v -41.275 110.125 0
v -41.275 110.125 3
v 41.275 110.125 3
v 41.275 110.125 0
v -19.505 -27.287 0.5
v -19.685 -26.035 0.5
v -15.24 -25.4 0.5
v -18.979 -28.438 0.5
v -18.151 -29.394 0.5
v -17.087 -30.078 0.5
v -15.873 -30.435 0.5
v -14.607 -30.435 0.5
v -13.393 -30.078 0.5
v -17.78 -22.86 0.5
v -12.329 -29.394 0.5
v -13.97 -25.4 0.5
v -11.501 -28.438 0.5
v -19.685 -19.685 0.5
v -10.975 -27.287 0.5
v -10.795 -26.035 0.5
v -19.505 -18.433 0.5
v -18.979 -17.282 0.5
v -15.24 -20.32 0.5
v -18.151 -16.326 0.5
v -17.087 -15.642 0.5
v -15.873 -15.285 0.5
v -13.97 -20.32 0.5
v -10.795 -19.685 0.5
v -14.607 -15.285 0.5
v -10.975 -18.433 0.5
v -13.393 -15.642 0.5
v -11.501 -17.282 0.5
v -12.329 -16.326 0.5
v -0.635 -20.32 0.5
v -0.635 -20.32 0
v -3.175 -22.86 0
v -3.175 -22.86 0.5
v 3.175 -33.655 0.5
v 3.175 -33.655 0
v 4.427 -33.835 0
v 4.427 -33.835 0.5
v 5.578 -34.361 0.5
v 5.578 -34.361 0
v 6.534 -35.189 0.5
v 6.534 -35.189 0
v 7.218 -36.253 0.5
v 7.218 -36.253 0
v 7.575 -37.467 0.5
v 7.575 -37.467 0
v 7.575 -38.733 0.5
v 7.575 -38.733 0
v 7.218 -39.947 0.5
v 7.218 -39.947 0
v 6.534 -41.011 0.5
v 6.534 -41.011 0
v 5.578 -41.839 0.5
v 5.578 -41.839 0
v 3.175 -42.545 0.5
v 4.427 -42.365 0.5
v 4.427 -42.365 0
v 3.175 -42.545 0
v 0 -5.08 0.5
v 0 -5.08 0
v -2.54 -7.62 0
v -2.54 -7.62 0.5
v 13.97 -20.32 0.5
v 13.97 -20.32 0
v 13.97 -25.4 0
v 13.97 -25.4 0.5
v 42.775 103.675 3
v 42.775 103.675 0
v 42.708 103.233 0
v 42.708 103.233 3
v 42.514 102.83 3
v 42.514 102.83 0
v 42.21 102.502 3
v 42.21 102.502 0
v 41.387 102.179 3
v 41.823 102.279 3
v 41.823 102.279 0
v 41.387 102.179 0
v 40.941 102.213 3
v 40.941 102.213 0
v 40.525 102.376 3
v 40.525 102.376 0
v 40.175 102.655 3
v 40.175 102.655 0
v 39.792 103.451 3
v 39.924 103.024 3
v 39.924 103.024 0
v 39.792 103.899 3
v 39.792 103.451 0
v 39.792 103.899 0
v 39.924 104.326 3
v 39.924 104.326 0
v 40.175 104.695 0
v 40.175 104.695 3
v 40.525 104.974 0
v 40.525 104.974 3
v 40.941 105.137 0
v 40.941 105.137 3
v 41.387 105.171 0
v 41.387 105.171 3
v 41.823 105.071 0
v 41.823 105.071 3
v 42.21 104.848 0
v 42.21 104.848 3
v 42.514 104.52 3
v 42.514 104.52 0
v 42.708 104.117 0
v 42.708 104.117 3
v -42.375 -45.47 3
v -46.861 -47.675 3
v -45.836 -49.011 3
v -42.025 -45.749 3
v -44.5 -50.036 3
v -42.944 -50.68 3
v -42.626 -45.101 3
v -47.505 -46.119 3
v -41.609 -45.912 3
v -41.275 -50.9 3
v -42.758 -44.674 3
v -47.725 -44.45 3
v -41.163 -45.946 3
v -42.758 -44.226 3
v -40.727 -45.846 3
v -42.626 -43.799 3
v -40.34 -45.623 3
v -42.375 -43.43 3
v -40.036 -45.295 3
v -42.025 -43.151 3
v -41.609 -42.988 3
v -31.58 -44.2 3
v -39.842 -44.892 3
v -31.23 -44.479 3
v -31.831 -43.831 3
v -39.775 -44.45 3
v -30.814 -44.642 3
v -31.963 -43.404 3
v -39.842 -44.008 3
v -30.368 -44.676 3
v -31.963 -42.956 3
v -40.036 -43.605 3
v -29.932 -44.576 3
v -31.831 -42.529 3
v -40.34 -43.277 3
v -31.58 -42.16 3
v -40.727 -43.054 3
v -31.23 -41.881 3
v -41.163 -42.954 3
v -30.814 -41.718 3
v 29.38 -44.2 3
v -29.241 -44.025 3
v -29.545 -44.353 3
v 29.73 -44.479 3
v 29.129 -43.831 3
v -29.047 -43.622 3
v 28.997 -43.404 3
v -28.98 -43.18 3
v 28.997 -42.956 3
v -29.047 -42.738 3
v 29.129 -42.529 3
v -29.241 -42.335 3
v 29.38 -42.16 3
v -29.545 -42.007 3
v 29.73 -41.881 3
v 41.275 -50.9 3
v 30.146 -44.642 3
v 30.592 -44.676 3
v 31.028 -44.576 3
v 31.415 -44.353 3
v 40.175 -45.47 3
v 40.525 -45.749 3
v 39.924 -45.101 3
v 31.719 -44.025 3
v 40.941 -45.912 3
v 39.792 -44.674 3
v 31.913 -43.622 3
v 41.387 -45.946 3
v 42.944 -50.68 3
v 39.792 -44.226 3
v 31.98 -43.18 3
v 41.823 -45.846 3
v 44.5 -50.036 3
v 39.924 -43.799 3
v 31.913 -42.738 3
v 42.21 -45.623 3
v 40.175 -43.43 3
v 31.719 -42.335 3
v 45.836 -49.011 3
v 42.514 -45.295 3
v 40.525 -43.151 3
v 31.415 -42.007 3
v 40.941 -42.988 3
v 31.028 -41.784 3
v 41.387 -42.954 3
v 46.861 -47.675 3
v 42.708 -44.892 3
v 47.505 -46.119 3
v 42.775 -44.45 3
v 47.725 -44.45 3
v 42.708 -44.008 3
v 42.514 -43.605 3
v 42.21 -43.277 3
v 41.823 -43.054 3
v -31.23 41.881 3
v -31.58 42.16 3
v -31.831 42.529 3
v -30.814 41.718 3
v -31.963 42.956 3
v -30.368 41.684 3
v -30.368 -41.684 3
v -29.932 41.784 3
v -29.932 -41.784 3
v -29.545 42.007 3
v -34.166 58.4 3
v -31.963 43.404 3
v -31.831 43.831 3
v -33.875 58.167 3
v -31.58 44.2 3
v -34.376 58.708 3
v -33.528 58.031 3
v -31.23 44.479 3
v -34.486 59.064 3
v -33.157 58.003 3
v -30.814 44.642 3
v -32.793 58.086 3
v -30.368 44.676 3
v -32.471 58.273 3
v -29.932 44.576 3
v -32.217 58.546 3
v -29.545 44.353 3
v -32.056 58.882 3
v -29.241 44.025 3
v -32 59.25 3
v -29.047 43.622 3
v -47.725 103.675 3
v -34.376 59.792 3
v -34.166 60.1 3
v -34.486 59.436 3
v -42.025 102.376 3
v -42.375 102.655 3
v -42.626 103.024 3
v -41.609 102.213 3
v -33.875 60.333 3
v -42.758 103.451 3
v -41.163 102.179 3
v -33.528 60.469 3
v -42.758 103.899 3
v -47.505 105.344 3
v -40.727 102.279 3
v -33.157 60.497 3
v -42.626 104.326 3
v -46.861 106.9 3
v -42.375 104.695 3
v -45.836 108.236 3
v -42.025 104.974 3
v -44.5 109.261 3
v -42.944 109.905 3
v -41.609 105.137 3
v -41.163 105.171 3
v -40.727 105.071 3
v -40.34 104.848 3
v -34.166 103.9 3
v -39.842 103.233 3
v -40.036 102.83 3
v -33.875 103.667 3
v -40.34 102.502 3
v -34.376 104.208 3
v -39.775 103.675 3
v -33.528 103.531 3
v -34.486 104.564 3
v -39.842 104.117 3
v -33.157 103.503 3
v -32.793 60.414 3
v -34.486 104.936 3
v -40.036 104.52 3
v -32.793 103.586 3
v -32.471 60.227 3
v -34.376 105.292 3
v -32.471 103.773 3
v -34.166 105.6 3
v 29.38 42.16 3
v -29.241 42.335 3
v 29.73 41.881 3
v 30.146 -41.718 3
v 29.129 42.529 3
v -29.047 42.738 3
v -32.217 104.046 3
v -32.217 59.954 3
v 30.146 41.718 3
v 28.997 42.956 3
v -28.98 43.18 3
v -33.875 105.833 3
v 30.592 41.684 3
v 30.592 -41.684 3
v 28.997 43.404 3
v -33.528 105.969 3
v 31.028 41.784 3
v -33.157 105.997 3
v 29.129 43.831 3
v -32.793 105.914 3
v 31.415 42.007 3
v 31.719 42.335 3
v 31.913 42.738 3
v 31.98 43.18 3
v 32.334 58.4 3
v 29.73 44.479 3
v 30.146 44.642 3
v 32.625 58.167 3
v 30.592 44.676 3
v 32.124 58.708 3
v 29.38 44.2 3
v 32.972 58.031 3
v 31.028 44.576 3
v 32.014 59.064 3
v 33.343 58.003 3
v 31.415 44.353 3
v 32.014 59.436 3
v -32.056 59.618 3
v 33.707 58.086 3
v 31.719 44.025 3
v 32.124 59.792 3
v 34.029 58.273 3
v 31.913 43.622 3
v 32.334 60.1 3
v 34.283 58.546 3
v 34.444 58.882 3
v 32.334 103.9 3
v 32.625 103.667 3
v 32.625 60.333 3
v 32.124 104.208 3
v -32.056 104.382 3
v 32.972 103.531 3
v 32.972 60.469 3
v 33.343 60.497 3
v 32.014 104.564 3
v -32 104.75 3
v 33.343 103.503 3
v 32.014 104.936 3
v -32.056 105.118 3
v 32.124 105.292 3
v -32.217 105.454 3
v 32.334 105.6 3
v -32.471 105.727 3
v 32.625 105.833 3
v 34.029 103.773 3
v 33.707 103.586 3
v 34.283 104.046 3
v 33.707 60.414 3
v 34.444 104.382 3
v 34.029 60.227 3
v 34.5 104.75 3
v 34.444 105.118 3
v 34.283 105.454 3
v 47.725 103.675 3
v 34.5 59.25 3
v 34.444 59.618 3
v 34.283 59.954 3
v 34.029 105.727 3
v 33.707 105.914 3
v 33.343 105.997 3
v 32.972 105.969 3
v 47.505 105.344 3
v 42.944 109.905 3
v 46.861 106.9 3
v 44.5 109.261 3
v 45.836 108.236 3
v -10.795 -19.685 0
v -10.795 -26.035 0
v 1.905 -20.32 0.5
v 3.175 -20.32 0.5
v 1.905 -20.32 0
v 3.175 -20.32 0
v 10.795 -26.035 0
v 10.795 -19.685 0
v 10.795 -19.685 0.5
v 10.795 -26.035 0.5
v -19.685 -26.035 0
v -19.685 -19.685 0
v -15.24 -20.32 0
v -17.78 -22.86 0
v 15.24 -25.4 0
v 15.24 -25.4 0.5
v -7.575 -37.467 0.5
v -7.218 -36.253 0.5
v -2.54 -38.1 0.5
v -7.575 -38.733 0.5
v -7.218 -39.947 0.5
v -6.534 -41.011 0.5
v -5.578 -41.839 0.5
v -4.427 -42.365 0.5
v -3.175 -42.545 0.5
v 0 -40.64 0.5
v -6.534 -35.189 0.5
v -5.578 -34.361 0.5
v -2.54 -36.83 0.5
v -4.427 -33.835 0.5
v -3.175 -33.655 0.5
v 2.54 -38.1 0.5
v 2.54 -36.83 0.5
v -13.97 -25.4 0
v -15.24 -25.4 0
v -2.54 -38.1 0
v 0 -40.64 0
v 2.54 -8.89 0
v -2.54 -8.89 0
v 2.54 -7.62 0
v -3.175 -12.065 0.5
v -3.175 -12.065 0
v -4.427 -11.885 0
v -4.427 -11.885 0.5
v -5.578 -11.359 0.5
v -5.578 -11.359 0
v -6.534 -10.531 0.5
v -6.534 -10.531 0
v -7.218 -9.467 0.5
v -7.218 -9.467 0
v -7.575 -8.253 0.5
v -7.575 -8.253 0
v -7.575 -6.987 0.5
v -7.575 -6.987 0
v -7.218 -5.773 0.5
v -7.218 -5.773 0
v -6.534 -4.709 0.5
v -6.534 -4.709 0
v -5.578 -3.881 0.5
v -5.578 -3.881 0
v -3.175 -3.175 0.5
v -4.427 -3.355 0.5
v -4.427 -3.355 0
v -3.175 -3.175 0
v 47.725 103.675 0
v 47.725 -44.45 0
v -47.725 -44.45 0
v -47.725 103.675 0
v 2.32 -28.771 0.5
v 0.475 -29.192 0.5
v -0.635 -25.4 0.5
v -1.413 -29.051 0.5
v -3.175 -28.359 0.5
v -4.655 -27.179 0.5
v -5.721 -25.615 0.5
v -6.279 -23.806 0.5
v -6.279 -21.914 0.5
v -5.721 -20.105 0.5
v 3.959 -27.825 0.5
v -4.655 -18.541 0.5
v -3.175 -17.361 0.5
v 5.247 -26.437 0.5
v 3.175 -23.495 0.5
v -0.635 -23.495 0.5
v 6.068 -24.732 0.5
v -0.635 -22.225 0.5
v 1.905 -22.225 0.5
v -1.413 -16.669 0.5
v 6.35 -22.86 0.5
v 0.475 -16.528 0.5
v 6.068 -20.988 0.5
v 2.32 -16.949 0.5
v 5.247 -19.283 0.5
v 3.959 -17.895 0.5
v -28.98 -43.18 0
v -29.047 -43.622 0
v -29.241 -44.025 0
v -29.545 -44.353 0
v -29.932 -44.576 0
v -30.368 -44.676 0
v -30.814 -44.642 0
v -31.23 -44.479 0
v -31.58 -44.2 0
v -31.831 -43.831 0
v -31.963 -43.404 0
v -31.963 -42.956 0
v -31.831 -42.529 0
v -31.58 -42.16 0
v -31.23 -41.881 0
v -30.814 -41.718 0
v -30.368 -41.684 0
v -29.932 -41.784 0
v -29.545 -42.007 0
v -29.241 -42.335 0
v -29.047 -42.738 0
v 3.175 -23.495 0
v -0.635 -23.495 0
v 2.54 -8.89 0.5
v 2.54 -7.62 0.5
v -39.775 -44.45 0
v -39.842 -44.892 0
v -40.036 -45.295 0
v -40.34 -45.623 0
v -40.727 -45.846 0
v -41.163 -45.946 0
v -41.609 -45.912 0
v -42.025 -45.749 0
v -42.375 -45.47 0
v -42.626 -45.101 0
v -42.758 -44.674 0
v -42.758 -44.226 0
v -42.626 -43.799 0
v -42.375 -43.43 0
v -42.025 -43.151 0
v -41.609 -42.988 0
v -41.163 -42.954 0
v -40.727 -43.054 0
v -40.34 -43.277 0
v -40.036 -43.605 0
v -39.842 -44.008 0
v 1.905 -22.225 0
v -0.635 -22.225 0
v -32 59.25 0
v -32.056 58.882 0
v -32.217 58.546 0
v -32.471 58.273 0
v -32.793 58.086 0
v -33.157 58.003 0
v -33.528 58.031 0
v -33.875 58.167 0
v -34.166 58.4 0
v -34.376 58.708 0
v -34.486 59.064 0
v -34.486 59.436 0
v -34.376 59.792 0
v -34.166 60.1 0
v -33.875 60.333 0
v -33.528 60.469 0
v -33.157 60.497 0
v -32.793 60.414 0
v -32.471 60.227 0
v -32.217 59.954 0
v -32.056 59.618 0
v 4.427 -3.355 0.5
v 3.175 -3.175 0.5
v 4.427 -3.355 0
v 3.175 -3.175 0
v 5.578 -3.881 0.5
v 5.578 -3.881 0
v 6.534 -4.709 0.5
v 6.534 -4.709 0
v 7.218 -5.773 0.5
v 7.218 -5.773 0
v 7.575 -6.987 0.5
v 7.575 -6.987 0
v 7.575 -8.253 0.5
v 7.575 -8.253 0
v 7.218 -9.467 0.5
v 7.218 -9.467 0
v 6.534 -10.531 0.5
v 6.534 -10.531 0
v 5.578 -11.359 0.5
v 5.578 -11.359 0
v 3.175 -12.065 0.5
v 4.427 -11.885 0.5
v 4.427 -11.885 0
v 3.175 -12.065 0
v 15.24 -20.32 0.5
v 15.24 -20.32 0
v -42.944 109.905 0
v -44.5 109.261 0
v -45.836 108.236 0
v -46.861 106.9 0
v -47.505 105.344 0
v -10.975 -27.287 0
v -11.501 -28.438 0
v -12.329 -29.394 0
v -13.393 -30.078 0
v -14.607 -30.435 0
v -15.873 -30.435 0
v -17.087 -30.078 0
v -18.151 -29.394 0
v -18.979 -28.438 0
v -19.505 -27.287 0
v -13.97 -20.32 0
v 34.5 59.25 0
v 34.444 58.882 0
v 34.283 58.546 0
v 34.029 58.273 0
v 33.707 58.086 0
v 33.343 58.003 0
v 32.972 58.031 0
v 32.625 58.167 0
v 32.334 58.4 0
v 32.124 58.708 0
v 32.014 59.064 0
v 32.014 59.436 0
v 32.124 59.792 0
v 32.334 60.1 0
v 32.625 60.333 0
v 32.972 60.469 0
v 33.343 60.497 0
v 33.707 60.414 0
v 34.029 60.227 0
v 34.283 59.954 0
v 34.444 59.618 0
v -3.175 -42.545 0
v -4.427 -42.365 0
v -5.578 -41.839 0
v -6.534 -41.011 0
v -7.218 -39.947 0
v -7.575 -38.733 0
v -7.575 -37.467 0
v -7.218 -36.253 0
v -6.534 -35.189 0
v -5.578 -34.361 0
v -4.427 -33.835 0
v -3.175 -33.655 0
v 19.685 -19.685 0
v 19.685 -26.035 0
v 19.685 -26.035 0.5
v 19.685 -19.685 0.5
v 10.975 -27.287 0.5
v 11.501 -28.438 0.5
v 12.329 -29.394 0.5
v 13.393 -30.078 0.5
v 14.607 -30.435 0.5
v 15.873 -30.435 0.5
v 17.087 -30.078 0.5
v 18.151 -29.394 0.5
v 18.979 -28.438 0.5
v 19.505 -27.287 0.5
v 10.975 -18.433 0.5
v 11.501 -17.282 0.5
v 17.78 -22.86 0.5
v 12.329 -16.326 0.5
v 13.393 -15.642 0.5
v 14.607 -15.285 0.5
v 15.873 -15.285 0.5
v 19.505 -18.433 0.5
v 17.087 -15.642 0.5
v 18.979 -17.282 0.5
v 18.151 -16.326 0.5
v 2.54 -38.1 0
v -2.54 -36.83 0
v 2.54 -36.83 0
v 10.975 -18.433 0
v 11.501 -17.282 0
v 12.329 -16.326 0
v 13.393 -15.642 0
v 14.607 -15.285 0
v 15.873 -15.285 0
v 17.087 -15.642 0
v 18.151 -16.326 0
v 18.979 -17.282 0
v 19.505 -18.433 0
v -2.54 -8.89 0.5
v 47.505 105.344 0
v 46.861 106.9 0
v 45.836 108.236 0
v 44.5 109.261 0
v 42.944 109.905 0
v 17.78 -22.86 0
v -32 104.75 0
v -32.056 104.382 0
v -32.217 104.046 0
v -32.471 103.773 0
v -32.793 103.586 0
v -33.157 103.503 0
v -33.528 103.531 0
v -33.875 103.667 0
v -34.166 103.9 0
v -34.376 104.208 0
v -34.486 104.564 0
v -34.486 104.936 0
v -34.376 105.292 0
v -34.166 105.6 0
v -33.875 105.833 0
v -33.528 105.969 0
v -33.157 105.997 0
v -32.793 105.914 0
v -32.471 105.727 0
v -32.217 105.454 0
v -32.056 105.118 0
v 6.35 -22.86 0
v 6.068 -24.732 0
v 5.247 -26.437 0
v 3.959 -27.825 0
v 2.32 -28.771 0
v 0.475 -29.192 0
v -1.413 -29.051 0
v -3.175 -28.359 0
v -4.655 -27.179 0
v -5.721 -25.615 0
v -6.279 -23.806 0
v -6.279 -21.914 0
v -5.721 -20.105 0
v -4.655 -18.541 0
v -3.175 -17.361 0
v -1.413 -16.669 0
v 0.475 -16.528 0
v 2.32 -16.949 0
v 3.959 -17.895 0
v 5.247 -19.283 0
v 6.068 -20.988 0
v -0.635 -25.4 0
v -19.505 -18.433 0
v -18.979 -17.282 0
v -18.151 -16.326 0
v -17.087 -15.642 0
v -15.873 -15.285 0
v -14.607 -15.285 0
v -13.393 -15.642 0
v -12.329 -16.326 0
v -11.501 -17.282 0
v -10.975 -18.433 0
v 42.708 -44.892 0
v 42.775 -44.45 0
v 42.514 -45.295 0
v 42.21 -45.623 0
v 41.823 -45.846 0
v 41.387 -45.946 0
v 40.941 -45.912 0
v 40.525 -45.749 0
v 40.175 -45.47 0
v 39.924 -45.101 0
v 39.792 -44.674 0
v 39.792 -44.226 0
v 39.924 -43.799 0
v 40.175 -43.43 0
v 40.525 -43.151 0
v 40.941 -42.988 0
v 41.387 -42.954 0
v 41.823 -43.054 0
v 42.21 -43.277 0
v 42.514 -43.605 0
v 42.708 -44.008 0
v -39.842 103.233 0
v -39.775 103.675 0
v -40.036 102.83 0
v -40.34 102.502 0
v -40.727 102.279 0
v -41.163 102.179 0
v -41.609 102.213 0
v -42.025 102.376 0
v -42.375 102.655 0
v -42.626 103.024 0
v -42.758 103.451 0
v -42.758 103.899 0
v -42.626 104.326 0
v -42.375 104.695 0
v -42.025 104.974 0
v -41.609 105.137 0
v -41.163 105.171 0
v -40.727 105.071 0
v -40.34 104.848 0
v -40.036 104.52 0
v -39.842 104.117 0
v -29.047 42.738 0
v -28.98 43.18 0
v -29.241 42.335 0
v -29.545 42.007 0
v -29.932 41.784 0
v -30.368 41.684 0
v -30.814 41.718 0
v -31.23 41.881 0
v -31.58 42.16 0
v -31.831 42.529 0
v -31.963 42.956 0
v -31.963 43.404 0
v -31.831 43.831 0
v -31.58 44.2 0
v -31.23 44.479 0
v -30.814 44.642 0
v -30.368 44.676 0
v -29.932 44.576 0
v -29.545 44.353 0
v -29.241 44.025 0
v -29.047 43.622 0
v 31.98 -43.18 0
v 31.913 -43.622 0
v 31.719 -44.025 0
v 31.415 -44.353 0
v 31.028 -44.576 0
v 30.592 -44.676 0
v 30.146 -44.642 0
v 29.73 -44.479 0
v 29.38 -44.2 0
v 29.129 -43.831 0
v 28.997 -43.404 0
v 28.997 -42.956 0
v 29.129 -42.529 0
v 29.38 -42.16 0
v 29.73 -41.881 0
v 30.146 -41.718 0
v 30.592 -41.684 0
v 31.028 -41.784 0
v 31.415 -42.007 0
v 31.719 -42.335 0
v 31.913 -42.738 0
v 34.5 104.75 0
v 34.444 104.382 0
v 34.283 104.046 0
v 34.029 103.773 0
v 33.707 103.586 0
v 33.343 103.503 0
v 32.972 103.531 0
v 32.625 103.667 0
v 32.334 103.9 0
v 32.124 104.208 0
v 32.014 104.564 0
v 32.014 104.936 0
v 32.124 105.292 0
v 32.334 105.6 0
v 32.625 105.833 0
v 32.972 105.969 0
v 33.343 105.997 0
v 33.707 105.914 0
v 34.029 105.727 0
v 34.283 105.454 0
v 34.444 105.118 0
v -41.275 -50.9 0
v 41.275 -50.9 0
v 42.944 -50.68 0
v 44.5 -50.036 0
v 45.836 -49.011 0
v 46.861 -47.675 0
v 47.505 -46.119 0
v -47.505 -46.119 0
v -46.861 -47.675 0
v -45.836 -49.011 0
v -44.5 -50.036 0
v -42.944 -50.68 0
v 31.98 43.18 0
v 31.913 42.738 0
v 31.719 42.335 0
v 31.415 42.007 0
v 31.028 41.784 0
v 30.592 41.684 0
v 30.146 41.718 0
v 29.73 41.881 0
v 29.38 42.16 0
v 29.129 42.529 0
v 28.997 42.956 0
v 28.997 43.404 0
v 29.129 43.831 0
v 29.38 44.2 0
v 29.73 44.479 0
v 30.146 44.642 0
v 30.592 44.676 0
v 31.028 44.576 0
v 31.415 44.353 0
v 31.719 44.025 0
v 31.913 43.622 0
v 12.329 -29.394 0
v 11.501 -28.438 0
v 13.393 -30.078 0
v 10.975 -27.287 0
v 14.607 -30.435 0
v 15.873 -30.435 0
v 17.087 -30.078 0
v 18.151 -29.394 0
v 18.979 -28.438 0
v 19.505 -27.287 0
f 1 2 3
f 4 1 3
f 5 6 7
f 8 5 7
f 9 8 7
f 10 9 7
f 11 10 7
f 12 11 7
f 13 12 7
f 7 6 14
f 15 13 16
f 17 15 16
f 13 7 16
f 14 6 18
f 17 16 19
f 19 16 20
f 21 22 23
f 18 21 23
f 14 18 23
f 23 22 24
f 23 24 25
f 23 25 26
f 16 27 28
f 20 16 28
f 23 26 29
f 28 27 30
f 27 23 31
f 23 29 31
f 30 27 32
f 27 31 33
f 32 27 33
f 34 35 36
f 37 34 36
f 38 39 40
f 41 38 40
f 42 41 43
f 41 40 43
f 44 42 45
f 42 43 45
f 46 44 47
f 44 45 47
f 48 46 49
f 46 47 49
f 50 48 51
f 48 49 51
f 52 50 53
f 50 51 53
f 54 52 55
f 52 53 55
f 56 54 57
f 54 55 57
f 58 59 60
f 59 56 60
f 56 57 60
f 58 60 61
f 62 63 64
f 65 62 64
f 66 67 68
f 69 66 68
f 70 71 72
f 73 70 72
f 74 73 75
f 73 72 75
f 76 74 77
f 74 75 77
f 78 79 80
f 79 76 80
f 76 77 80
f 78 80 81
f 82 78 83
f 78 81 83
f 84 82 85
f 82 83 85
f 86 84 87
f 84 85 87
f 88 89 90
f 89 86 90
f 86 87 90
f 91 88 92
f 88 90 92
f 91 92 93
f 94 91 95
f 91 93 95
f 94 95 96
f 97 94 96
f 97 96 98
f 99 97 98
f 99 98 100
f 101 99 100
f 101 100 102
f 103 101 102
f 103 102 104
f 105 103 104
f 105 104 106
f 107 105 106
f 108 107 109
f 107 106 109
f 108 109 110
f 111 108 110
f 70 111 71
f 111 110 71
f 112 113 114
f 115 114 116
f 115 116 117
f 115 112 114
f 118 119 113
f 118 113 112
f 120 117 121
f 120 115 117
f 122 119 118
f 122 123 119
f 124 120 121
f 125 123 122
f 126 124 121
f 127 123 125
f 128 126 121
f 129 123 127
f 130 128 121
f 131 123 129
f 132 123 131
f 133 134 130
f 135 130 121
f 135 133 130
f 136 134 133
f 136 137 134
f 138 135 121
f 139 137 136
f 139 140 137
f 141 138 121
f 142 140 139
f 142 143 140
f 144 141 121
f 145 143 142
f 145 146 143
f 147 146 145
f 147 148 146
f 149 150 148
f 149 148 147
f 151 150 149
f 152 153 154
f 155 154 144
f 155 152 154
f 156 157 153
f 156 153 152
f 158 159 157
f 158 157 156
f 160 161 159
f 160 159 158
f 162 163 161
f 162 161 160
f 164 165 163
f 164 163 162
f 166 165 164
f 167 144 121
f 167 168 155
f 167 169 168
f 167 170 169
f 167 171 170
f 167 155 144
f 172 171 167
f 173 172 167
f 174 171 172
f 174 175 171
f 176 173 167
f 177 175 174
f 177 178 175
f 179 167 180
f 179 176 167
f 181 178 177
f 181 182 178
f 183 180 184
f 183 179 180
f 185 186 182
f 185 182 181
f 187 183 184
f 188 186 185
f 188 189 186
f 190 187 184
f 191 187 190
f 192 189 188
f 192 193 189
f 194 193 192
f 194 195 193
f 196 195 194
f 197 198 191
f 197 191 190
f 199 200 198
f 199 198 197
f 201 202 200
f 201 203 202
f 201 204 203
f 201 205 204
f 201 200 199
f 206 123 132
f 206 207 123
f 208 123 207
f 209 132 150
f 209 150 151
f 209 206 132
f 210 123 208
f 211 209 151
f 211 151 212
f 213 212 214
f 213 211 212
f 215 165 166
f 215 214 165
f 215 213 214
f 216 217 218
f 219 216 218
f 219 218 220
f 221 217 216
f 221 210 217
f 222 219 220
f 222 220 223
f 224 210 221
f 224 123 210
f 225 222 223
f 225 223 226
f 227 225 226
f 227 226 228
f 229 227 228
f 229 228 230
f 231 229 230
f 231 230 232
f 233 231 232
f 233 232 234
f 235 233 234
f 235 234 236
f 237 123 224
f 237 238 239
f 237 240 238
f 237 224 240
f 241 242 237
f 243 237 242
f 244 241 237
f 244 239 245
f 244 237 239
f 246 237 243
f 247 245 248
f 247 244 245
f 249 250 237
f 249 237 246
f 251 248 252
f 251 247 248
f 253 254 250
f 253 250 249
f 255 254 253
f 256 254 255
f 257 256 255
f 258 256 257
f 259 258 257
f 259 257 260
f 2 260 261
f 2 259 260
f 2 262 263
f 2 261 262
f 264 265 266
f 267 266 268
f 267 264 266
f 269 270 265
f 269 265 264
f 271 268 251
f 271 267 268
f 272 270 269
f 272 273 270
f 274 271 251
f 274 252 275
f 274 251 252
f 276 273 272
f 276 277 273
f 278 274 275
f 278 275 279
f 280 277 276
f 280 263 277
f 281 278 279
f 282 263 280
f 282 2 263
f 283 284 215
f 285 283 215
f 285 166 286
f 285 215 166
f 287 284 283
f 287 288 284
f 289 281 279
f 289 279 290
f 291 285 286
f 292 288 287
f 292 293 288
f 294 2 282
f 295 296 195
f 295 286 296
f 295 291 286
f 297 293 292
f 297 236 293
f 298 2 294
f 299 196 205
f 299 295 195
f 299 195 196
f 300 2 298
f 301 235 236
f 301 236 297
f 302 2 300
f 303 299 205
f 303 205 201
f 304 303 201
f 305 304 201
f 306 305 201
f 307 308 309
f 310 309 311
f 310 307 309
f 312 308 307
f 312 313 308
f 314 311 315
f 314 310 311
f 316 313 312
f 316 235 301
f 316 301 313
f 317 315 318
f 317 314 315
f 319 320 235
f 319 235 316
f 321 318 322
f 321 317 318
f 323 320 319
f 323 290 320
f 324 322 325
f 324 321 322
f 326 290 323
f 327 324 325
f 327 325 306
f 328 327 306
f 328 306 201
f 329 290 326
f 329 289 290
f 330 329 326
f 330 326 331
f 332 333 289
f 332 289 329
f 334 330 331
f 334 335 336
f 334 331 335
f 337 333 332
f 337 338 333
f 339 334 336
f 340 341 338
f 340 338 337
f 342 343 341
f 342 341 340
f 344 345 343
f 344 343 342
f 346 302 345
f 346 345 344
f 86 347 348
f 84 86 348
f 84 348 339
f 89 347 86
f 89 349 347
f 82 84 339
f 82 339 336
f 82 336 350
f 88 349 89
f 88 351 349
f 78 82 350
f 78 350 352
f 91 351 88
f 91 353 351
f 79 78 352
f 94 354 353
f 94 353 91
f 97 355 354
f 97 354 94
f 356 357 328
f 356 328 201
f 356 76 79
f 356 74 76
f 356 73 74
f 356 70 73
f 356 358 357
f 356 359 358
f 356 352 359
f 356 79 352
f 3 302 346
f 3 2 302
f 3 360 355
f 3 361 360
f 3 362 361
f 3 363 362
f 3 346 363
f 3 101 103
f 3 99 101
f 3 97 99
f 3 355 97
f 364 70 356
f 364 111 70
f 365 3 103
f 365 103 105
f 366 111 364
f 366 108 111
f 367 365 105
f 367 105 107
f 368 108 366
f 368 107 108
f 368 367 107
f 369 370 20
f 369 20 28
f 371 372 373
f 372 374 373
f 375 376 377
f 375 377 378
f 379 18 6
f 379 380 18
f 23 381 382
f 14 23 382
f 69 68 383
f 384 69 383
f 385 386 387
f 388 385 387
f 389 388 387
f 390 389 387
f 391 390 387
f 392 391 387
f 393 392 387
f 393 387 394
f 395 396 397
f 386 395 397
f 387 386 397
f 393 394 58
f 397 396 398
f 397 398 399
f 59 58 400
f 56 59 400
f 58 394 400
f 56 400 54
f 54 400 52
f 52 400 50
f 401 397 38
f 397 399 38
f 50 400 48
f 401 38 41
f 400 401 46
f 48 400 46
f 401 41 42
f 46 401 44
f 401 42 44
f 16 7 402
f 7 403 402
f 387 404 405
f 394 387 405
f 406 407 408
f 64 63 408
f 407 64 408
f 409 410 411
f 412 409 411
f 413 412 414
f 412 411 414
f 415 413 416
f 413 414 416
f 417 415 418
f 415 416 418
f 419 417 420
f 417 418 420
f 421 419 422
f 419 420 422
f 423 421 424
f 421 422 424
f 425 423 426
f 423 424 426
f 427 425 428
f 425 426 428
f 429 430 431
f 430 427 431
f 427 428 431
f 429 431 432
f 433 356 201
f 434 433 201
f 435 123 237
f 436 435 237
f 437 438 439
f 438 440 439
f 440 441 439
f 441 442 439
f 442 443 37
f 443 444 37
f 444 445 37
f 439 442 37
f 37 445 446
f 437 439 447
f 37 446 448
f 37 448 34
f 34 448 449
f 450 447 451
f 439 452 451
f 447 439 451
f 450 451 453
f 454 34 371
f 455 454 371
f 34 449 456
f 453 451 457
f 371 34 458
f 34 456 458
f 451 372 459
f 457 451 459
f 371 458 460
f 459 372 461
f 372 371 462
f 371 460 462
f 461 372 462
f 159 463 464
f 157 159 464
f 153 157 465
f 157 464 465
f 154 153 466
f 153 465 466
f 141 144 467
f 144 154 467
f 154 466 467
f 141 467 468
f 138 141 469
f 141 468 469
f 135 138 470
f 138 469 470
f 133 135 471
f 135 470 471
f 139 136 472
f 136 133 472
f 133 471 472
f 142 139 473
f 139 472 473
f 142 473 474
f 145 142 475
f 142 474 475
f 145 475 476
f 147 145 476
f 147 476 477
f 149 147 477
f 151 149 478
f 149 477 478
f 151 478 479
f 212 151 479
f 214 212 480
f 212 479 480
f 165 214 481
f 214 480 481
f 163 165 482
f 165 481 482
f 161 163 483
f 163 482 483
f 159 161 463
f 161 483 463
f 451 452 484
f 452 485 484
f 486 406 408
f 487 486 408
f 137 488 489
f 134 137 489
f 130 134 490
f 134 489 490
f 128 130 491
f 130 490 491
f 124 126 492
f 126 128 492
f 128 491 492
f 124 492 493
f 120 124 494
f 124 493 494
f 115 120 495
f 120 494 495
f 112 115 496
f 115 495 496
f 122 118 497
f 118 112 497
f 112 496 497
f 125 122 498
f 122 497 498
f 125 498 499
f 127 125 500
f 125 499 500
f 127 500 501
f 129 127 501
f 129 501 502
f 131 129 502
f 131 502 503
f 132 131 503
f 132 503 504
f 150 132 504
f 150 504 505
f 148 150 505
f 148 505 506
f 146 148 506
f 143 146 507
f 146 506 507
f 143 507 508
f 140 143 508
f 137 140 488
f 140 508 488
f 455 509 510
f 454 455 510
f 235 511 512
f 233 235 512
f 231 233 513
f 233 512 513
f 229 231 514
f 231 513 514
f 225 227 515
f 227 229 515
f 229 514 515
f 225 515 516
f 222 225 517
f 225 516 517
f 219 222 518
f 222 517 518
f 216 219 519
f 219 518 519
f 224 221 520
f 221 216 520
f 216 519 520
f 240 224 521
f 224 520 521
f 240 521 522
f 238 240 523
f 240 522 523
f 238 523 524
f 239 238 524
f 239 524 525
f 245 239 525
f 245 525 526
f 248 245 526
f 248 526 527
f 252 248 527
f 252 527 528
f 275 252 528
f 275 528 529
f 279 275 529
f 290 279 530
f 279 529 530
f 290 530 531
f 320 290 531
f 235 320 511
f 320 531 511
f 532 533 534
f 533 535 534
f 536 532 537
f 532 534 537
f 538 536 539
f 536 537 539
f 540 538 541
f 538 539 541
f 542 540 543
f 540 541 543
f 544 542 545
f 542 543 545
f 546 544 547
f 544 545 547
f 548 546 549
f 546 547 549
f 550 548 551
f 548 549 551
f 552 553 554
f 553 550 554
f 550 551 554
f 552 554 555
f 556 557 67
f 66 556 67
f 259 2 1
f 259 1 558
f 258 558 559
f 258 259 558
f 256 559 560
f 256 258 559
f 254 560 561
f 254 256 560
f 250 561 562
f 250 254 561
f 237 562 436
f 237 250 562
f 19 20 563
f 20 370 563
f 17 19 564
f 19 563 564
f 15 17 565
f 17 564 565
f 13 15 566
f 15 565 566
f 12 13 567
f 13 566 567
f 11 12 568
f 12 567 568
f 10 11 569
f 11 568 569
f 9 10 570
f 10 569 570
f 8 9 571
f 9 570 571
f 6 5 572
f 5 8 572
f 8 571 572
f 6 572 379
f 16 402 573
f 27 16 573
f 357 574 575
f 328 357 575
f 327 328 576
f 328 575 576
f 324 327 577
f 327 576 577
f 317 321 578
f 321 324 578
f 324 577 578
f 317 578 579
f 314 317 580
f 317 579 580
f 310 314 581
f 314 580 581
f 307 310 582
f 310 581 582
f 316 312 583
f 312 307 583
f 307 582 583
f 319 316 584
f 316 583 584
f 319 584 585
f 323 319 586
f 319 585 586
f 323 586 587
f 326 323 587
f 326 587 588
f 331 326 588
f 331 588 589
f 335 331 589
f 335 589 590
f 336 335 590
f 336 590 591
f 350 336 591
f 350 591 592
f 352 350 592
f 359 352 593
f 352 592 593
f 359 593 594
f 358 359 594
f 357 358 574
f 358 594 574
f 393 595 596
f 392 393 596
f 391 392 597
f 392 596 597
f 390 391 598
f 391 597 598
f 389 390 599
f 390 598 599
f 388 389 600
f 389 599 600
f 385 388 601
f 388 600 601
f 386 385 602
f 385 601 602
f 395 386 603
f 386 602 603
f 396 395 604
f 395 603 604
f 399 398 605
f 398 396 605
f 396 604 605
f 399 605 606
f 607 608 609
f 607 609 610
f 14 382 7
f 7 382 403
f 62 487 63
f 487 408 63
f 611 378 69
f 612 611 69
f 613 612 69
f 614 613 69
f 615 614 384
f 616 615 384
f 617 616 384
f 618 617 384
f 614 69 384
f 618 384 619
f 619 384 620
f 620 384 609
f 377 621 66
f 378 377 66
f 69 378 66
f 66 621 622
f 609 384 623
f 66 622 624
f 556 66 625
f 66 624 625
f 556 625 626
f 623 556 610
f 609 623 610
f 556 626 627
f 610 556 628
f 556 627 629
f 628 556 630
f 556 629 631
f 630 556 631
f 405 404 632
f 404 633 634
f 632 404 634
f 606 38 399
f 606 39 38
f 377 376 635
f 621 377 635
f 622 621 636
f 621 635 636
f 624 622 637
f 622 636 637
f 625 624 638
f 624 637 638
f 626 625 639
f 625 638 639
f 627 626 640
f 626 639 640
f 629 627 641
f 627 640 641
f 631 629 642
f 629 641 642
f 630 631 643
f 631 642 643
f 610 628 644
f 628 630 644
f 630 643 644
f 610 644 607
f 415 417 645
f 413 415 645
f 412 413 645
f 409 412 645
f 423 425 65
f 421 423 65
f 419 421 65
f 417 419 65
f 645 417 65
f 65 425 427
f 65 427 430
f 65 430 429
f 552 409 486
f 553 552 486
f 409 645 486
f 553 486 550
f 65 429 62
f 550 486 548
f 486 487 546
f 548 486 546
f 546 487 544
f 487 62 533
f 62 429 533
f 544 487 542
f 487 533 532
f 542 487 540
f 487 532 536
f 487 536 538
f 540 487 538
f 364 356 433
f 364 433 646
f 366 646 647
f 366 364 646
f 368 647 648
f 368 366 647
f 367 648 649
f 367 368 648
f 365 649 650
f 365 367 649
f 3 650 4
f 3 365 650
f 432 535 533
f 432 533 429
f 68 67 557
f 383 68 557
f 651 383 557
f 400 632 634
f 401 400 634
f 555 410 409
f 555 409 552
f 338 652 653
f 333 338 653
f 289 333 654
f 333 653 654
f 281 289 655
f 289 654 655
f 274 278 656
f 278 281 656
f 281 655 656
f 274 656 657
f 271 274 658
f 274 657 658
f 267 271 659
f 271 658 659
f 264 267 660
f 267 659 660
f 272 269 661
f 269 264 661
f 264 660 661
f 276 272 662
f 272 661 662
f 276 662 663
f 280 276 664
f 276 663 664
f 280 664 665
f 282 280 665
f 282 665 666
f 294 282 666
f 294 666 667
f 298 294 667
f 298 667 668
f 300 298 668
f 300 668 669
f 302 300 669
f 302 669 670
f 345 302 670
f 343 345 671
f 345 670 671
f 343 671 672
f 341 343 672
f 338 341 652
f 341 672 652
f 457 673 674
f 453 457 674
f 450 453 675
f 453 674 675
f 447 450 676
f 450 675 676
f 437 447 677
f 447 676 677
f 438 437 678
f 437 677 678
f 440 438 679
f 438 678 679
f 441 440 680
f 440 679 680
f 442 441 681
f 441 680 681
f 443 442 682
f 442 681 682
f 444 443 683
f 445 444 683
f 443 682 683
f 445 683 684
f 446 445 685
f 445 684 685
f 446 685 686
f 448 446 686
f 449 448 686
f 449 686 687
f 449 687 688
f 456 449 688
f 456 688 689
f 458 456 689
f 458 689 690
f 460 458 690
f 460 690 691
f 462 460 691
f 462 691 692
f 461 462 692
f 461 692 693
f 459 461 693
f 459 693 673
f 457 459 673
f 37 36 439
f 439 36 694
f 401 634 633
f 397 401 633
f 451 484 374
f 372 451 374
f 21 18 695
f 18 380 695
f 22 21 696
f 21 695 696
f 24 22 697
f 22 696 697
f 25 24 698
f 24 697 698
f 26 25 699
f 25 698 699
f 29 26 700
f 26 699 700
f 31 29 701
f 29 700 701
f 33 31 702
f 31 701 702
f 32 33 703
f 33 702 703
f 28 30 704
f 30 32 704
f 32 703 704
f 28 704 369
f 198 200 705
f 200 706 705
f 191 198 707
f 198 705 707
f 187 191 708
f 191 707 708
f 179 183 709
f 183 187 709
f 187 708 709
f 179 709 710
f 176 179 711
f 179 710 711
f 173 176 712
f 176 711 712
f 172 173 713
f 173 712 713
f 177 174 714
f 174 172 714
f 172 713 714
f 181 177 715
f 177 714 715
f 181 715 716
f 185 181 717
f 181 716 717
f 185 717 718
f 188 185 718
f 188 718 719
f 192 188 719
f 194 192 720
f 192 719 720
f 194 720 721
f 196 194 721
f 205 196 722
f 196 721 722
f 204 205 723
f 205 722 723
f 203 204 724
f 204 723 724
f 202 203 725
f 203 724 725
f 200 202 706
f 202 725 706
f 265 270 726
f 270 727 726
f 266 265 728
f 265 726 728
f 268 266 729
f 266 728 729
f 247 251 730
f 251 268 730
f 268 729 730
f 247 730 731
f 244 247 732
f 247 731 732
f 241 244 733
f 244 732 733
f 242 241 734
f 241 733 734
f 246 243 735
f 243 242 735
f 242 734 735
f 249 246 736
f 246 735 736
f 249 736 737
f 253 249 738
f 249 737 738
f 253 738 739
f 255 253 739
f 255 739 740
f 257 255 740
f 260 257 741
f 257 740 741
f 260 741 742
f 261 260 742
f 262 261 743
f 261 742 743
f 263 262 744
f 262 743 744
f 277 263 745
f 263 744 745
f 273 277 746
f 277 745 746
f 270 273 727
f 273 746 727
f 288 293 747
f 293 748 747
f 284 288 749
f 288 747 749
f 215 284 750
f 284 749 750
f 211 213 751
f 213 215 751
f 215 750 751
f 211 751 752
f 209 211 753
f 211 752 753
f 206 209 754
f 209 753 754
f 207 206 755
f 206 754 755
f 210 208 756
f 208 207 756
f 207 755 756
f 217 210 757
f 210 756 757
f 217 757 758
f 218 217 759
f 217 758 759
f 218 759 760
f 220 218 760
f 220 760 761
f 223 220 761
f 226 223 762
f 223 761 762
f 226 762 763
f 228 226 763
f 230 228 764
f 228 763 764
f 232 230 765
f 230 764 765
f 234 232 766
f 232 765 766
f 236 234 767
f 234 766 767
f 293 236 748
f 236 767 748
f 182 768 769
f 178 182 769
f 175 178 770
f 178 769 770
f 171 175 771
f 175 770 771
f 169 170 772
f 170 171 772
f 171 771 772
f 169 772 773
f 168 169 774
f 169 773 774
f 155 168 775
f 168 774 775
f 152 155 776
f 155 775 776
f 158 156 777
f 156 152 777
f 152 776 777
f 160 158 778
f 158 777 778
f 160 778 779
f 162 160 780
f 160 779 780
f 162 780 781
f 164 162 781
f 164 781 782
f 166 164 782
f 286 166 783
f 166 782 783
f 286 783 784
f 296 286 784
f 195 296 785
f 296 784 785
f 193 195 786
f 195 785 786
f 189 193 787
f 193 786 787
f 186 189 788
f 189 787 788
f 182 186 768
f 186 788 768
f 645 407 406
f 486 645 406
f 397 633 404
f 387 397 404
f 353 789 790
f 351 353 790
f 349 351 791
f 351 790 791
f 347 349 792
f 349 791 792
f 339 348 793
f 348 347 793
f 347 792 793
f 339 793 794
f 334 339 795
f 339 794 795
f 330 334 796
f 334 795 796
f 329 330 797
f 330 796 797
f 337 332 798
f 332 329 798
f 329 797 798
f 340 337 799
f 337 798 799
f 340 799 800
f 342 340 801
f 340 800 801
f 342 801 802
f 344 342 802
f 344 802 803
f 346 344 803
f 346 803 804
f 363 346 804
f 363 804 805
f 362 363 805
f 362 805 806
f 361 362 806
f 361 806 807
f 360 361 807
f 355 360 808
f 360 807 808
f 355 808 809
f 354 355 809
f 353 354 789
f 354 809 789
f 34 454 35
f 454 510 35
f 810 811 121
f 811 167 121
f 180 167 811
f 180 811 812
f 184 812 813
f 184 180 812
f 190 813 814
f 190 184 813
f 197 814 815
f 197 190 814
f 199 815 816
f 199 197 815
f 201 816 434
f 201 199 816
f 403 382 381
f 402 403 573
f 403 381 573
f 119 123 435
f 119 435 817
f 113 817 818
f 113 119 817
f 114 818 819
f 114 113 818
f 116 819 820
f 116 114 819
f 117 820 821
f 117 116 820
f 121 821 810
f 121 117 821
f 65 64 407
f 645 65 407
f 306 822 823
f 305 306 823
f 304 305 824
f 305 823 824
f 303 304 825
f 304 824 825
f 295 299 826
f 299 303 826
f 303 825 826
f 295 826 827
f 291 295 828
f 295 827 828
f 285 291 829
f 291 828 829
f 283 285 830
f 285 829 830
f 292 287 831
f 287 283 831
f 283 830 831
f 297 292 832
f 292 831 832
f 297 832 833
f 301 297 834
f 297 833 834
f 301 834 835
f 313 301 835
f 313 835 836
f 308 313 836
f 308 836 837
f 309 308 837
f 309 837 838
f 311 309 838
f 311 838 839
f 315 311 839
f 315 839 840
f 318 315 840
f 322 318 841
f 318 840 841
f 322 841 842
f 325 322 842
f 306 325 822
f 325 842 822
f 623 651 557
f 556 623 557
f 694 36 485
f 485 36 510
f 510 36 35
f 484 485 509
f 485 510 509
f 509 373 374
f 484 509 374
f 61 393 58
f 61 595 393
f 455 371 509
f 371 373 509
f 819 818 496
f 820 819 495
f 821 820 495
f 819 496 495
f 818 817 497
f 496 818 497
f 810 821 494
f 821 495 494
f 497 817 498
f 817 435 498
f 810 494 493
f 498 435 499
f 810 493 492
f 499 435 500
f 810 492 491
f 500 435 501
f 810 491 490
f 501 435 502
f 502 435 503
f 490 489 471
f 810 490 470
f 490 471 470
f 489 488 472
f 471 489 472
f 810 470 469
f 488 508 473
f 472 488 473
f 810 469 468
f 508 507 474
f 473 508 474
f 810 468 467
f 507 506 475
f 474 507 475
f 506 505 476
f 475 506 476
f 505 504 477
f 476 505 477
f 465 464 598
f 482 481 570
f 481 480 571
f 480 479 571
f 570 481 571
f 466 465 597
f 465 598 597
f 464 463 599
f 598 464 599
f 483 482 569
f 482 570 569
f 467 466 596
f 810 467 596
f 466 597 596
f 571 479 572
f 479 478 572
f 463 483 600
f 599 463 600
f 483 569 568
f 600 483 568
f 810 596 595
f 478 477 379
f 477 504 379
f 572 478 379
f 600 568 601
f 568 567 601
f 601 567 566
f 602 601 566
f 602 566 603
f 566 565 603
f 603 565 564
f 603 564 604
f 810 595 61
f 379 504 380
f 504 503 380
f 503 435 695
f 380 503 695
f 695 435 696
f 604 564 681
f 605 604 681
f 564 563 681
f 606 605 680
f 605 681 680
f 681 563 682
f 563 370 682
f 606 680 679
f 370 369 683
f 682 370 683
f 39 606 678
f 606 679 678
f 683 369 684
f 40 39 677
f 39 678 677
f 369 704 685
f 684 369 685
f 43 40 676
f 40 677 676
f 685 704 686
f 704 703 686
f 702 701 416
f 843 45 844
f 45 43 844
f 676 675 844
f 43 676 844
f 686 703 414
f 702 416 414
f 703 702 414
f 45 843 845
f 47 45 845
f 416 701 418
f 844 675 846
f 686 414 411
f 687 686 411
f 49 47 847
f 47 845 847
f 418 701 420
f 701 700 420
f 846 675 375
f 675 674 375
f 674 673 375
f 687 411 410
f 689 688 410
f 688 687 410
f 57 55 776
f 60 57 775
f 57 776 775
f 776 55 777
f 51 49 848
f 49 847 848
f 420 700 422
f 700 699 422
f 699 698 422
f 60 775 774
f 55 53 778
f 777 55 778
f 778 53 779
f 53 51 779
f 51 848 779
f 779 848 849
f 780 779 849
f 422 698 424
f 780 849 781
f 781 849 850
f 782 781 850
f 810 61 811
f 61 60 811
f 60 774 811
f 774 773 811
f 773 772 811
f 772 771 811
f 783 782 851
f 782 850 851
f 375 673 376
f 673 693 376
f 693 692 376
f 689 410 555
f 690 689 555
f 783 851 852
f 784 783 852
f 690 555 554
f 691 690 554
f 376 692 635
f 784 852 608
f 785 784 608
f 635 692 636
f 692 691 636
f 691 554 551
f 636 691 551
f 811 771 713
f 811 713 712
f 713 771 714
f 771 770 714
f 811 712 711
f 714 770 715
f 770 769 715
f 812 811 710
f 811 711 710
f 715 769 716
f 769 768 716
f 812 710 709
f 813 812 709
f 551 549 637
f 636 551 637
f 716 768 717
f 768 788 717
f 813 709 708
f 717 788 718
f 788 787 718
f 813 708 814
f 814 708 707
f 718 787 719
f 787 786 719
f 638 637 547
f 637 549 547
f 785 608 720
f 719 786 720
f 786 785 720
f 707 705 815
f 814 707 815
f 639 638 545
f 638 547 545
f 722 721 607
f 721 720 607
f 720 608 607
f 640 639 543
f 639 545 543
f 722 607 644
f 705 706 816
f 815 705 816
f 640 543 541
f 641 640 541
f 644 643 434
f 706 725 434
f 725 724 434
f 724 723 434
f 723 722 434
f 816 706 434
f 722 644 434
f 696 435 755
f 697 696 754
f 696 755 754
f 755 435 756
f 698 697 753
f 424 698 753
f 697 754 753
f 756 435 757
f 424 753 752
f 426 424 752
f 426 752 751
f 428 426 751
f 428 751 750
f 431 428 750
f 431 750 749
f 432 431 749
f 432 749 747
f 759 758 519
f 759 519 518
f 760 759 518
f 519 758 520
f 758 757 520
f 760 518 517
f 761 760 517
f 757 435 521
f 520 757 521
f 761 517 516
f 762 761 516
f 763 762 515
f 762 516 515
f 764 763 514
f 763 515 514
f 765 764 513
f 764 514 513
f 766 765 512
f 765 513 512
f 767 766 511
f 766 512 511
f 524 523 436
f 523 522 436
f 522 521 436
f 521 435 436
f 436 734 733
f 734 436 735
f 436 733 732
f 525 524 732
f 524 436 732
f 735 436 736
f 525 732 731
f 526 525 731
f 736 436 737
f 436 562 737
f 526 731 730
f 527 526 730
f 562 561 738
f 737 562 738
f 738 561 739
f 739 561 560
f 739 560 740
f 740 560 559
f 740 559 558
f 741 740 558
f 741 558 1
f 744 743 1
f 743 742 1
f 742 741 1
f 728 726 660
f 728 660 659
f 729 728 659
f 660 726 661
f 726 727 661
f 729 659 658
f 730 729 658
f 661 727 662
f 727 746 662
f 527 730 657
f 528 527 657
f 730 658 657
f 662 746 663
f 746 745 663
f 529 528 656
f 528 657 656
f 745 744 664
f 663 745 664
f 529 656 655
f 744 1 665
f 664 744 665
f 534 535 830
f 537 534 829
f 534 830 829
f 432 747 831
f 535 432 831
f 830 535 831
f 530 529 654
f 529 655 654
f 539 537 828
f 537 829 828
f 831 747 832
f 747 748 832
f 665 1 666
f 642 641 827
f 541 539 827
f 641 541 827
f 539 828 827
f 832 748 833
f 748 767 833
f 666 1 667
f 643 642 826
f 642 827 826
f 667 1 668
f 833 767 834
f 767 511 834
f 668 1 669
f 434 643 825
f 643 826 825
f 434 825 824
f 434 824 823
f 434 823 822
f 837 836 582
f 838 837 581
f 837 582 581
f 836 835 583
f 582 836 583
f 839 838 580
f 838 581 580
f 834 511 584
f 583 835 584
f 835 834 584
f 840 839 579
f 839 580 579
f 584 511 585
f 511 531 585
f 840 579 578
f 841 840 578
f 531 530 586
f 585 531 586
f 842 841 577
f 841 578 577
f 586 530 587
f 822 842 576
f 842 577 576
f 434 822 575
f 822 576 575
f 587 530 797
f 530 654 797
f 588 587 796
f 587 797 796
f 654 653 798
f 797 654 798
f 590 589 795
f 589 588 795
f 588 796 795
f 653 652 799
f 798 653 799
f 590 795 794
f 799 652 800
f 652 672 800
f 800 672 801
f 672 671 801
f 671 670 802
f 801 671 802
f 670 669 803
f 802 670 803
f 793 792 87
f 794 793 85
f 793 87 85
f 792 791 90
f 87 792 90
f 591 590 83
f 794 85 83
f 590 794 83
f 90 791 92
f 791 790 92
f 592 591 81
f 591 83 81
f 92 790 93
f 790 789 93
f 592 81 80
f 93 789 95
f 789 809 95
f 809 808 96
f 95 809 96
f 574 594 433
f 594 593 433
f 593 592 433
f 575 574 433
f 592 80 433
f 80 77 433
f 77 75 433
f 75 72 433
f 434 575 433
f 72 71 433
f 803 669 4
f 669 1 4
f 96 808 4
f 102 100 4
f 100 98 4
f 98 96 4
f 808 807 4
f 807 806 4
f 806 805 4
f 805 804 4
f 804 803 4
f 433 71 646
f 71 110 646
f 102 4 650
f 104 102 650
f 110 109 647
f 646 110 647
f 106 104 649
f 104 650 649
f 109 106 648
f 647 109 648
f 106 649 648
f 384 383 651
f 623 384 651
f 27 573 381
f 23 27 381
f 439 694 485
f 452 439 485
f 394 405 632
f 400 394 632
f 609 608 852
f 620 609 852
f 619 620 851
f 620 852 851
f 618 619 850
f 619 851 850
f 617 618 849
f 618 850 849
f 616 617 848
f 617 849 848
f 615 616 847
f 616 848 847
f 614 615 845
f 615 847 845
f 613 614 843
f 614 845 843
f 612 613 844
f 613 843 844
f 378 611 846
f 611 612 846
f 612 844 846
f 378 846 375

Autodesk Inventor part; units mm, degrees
ref_plane "YZ Plane" through (0, 0, 0) normal (1, 0, 0) x (0, 1, 0)
ref_plane "XZ Plane" through (0, 0, 0) normal (0, 1, 0) x (-1, 0, 0)
ref_plane "XY Plane" through (0, 0, 0) normal (0, 0, 1) x (1, 0, 0)
sketch "Sketch1" plane through (0, 0, 0) normal (0, 0, 1) x (1, 0, 0)
  line L0 (30.48, -47.625) -> (-30.48, -47.625) construction
  line L1 (-34.925, -43.18) -> (-34.925, 43.18) construction
  line L2 (-30.48, 47.625) -> (30.48, 47.625) construction
  line L3 (34.925, 43.18) -> (34.925, -43.18) construction
  line L4 (34.925, -47.625) -> (-34.925, 47.625) construction
  line L5 (-34.925, -47.625) -> (34.925, 47.625) construction
  arc A0 (-30.48, 47.625) -> (-34.925, 43.18) centre (-30.48, 43.18) ccw construction
  arc A1 (34.925, 43.18) -> (30.48, 47.625) centre (30.48, 43.18) ccw construction
  arc A2 (30.48, -47.625) -> (34.925, -43.18) centre (30.48, -43.18) ccw construction
  arc A3 (-34.925, -43.18) -> (-30.48, -47.625) centre (-30.48, -43.18) ccw construction
  circle A4 centre (-30.48, 43.18) radius 1.5
  circle A5 centre (30.48, 43.18) radius 1.5
  circle A6 centre (-30.48, -43.18) radius 1.5
  circle A7 centre (30.48, -43.18) radius 1.5
  circle A8 centre (0, -22.86) radius 6.35
  line L6 (-3.175, -7.62) -> (3.175, -7.62) construction
  line L7 (-3.175, -12.065) -> (3.175, -12.065)
  line L8 (3.175, -3.175) -> (-3.175, -3.175)
  arc A9 (-3.175, -3.175) -> (-3.175, -12.065) centre (-3.175, -7.62) ccw
  arc A10 (3.175, -12.065) -> (3.175, -3.175) centre (3.175, -7.62) ccw
  line L9 (-35.3, 57.15) -> (35.3, 57.15) construction
  line L10 (35.3, 57.15) -> (35.3, 106.85) construction
  line L11 (35.3, 106.85) -> (-35.3, 106.85) construction
  line L12 (-35.3, 106.85) -> (-35.3, 57.15) construction
  circle A11 centre (-33.25, 104.75) radius 1.25
  circle A12 centre (33.25, 104.75) radius 1.25
  circle A13 centre (33.25, 59.25) radius 1.25
  circle A14 centre (-33.25, 59.25) radius 1.25
  line L13 (-41.275, 110.025) -> (41.275, 110.025)
  line L14 (47.625, 103.675) -> (47.625, -44.45)
  line L15 (41.275, -50.8) -> (-41.275, -50.8)
  line L16 (-47.625, -44.45) -> (-47.625, 103.675)
  arc A15 (-41.275, 110.025) -> (-47.625, 103.675) centre (-41.275, 103.675) ccw
  arc A16 (47.625, 103.675) -> (41.275, 110.025) centre (41.275, 103.675) ccw
  arc A17 (41.275, -50.8) -> (47.625, -44.45) centre (41.275, -44.45) ccw
  arc A18 (-47.625, -44.45) -> (-41.275, -50.8) centre (-41.275, -44.45) ccw
  circle A19 centre (-41.275, 103.675) radius 1.5
  circle A20 centre (-41.275, -44.45) radius 1.5
  circle A21 centre (41.275, -44.45) radius 1.5
  circle A22 centre (41.275, 103.675) radius 1.5
  line L17 (-0.635, -22.225) -> (-0.635, -20.32)
  line L18 (-0.635, -20.32) -> (-3.175, -22.86)
  line L19 (-3.175, -22.86) -> (-0.635, -25.4)
  line L20 (-0.635, -25.4) -> (-0.635, -23.495)
  line L21 (-0.635, -23.495) -> (3.175, -23.495)
  line L22 (3.175, -23.495) -> (3.175, -20.32)
  line L23 (3.175, -20.32) -> (1.905, -20.32)
  line L24 (1.905, -20.32) -> (1.905, -22.225)
  line L25 (1.905, -22.225) -> (-0.635, -22.225)
  line L26 (-2.54, -8.89) -> (2.54, -8.89)
  line L27 (2.54, -8.89) -> (2.54, -7.62)
  line L28 (2.54, -7.62) -> (0, -5.08)
  line L29 (0, -5.08) -> (-2.54, -7.62)
  line L30 (-2.54, -7.62) -> (-2.54, -8.89)
  arc A23 (-19.685, -26.035) -> (-10.795, -26.035) centre (-15.24, -26.035) ccw
  line L31 (-19.685, -19.685) -> (-19.685, -26.035)
  arc A24 (-10.795, -19.685) -> (-19.685, -19.685) centre (-15.24, -19.685) ccw
  line L32 (-10.795, -26.035) -> (-10.795, -19.685)
  line L33 (-13.97, -25.4) -> (-13.97, -20.32)
  line L34 (-13.97, -20.32) -> (-15.24, -20.32)
  line L35 (-15.24, -20.32) -> (-17.78, -22.86)
  line L36 (-17.78, -22.86) -> (-15.24, -25.4)
  line L37 (-15.24, -25.4) -> (-13.97, -25.4)
  arc A25 (3.175, -42.545) -> (3.175, -33.655) centre (3.175, -38.1) ccw
  line L38 (-3.175, -42.545) -> (3.175, -42.545)
  arc A26 (-3.175, -33.655) -> (-3.175, -42.545) centre (-3.175, -38.1) ccw
  line L39 (3.175, -33.655) -> (-3.175, -33.655)
  line L40 (2.54, -36.83) -> (-2.54, -36.83)
  line L41 (-2.54, -36.83) -> (-2.54, -38.1)
  line L42 (-2.54, -38.1) -> (0, -40.64)
  line L43 (0, -40.64) -> (2.54, -38.1)
  line L44 (2.54, -38.1) -> (2.54, -36.83)
  arc A27 (19.685, -19.685) -> (10.795, -19.685) centre (15.24, -19.685) ccw
  line L45 (19.685, -26.035) -> (19.685, -19.685)
  arc A28 (10.795, -26.035) -> (19.685, -26.035) centre (15.24, -26.035) ccw
  line L46 (10.795, -19.685) -> (10.795, -26.035)
  line L47 (13.97, -20.32) -> (13.97, -25.4)
  line L48 (13.97, -25.4) -> (15.24, -25.4)
  line L49 (15.24, -25.4) -> (17.78, -22.86)
  line L50 (17.78, -22.86) -> (15.24, -20.32)
  line L51 (15.24, -20.32) -> (13.97, -20.32)
  line L52 (5.205, 21.035) -> (16.385, 21.035) construction
  line L53 (16.385, 21.035) -> (16.385, 36.115) construction
  line L54 (16.385, 36.115) -> (5.205, 36.115) construction
  line L55 (5.205, 36.115) -> (5.205, 21.035) construction
  line L56 (5.205, 21.035) -> (16.385, 36.115) construction
  line L57 (16.385, 21.035) -> (5.205, 36.115) construction
  line L58 (20.265, 22.71) -> (29.265, 22.71) construction
  line L59 (29.265, 22.71) -> (29.265, 33.61) construction
  line L60 (29.265, 33.61) -> (20.265, 33.61) construction
  line L61 (20.265, 33.61) -> (20.265, 22.71) construction
  line L62 (-7.495, 36.115) -> (-7.495, 21.035) construction
  line L63 (3.685, 36.115) -> (-7.495, 36.115) construction
  line L64 (3.685, 21.035) -> (3.685, 36.115) construction
  line L65 (-7.495, 21.035) -> (3.685, 21.035) construction
  line L66 (-20.195, 36.115) -> (-20.195, 21.035) construction
  line L67 (-9.015, 36.115) -> (-20.195, 36.115) construction
  line L68 (-9.015, 21.035) -> (-9.015, 36.115) construction
  line L69 (-20.195, 21.035) -> (-9.015, 21.035) construction
  line L70 (-32.895, 36.115) -> (-32.895, 21.035) construction
  line L71 (-21.715, 36.115) -> (-32.895, 36.115) construction
  line L72 (-21.715, 21.035) -> (-21.715, 36.115) construction
  line L73 (-32.895, 21.035) -> (-21.715, 21.035) construction
  line L74 (-33.657, 37.385) -> (17.147, 37.385)
  line L75 (17.655, 36.877) -> (17.655, 35.388)
  line L76 (18.163, 34.88) -> (30.027, 34.88)
  line L77 (30.535, 34.372) -> (30.535, 21.948)
  line L78 (30.027, 21.44) -> (18.163, 21.44)
  line L79 (17.655, 20.932) -> (17.655, 20.273)
  line L80 (17.147, 19.765) -> (-33.657, 19.765)
  line L81 (-34.165, 20.273) -> (-34.165, 36.877)
  arc A29 (-33.657, 37.385) -> (-34.165, 36.877) centre (-33.657, 36.877) ccw
  arc A30 (17.655, 36.877) -> (17.147, 37.385) centre (17.147, 36.877) ccw
  arc A31 (17.655, 35.388) -> (18.163, 34.88) centre (18.163, 35.388) ccw
  arc A32 (30.535, 34.372) -> (30.027, 34.88) centre (30.027, 34.372) ccw
  arc A33 (30.027, 21.44) -> (30.535, 21.948) centre (30.027, 21.948) ccw
  arc A34 (18.163, 21.44) -> (17.655, 20.932) centre (18.163, 20.932) ccw
  arc A35 (17.147, 19.765) -> (17.655, 20.273) centre (17.147, 20.273) ccw
  arc A36 (-34.165, 20.273) -> (-33.657, 19.765) centre (-33.657, 20.273) ccw
  line L82 (-41.1, 50.8) -> (-38.1, 50.8)
  line L83 (-38.1, 50.8) -> (-38.1, 31.75)
  line L84 (-38.1, -38.1) -> (-41.1, -38.1)
  line L85 (-41.1, -38.1) -> (-41.1, -19.05)
  line L86 (-41.1, 31.75) -> (-38.1, 31.75)
  line L87 (-41.1, -19.05) -> (-38.1, -19.05)
  line L88 (-41.1, 31.75) -> (-41.1, 50.8)
  line L89 (-41.1, -19.05) -> (-41.1, 31.75) construction
  line L90 (-38.1, -19.05) -> (-38.1, -38.1)
  line L91 (-38.1, 31.75) -> (-38.1, -19.05) construction
  circle A37 centre (-39.6, 6.35) radius 1.5
  line L92 (0, -68.4111) -> (0, 116.4523)
  line L93 (41.1, 50.8) -> (38.1, 50.8)
  line L94 (38.1, 50.8) -> (38.1, 31.75)
  line L95 (38.1, -38.1) -> (41.1, -38.1)
  line L96 (41.1, -38.1) -> (41.1, -19.05)
  line L97 (41.1, 31.75) -> (38.1, 31.75)
  line L98 (41.1, -19.05) -> (38.1, -19.05)
  line L99 (41.1, 31.75) -> (41.1, 50.8)
  line L100 (38.1, -19.05) -> (38.1, -38.1)
  circle A38 centre (39.6, 6.35) radius 1.5
  point P0 (0, 0)
  point P1 (0, 0)
  point P2 (0, -7.62)
  point P3 (0, 57.15)
  point P4 (0, 0)
  point P5 (35.3, 82)
  point P6 (0, -8.89)
  point P7 (-13.97, -22.86)
  point P8 (0, -36.83)
  point P9 (13.97, -22.86)
  point P10 (10.795, 28.575)
  point P11 (24.765, 29.21)
  point P12 (24.765, 33.61)
  point P13 (-38.1, 6.35)
  point P14 (-39.6, 50.8)
  dimension "d0" = 69.85
  dimension "d1" = 95.25
  dimension "d2" = 4.445
  dimension "d3" = 3
  dimension "d4" = 24.765
  dimension "d5" = 12.7
  dimension "d6" = 6.35
  dimension "d7" = 8.89
  dimension "d8" = 15.24
  dimension "d9" = 70.6
  dimension "d10" = 49.7
  dimension "d11" = 9.525
  dimension "d12" = 66.5
  dimension "d13" = 33.25
  dimension "d14" = 45.5
  dimension "d15" = 22.75
  dimension "d16" = 2.5
  dimension "d17" = 3.175
  dimension "d18" = 12.7
  dimension "d19" = 3.175
  dimension "d20" = 12.7
  dimension "d21" = 6.35
  dimension "d22" = 3
  dimension "d25" = 1.27
  dimension "d26" = 1.27
  dimension "d27" = 0.635
  dimension "d28" = 0.635
  dimension "d29" = 5.08
  dimension "d30" = 2.54
  dimension "d31" = 3.81
  dimension "d32" = 3.175
  dimension "d33" = 5.08
  dimension "d34" = 1.27
  dimension "d35" = 2.54
  dimension "d38" = 360
  dimension "d42" = 11.18
  dimension "d43" = 15.08
  dimension "d44" = 19.05
  dimension "d45" = 24.13
  dimension "d54" = 6.5
  dimension "d55" = 10.9
  dimension "d56" = 9
  dimension "d57" = 10.16
  dimension "d58" = 18.415
  dimension "d61" = 12.7
  dimension "d66" = 1.27
  dimension "d67" = 1.27
  dimension "d68" = 1.27
  dimension "d69" = 1.27
  dimension "d70" = 1.27
  dimension "d71" = 1.27
  dimension "d72" = 1.27
  dimension "d73" = 0.508
  dimension "d74" = 3
  dimension "d76" = 12.7
  dimension "d77" = 88.9
  dimension "d78" = 19.05
  dimension "d79" = 19.05
  dimension "d80" = 3
  dimension "d81" = 76.2
extrude "Extrusion1" add sketch "Sketch1" along normal blind 3 contours A8 L92 L21 L22 L23 L24 L25 | A8 L92 L7 A10 L8 L80 A35 L79 A34 L78 A33 L77 A32 L76 A31 L75 A30 L74 L13 A16 L14 A17 L15 L38 A25 L39 | L92 L25 L17 L18 L19 L20 L21 A8 | A8 L92 L39 A26 L38 L15 A18 L16 A15 L13 L74 A29 L81 A36 L80 L8 A9 L7 | L92 L21 L20 L19 L18 L17 L25 | L25 L24 L23 L22 L21 L92 | L92 L26 L27 L28 L8 A10 L7 | L7 A9 L8 L92 L29 L30 L26 | L92 L40 L41 L42 L38 A26 L39 | L39 A25 L38 L92 L43 L44 L40 | L92 L28 L27 L26 | L26 L30 L29 L92 | L92 L42 L41 L40 | L40 L44 L43 L92 | L92 L74 A30 L75 A31 L76 A32 L77 A33 L78 A34 L79 A35 L80 | L80 A36 L81 A29 L74 L92 | L31 A24 L32 A23 | L37 L36 L35 L34 L33 | L45 A28 L46 A27 | L51 L50 L49 L48 L47 | L82 L83 L86 L88 | L84 L85 L87 L90 | A37 | L99 L97 L94 L93 | L100 L98 L96 L95 | A38
extrude "Extrusion2" cut sketch "Sketch1" along normal blind 0.5 contours A8 L92 L21 L22 L23 L24 L25 | L92 L25 L17 L18 L19 L20 L21 A8 | L92 L26 L27 L28 L8 A10 L7 | L7 A9 L8 L92 L29 L30 L26 | L92 L40 L41 L42 L38 A26 L39 | L39 A25 L38 L92 L43 L44 L40 | L31 A24 L32 A23 | L45 A28 L46 A27
sketch "Sketch2" plane through (0, 0, 3) normal (0, 0, 1) x (1, 0, 0)
  circle A0 centre (41.275, 103.675) radius 1.5 projected
  circle A1 centre (41.275, -44.45) radius 1.5 projected
  circle A2 centre (-41.275, -44.45) radius 1.5 projected
  circle A3 centre (-41.275, 103.675) radius 1.5 projected
  circle A4 centre (30.48, -43.18) radius 1.5 projected
  circle A5 centre (-30.48, -43.18) radius 1.5 projected
  circle A6 centre (30.48, 43.18) radius 1.5 projected
  circle A7 centre (-30.48, 43.18) radius 1.5 projected
  circle A8 centre (-33.25, 59.25) radius 1.25 projected
  circle A9 centre (33.25, 59.25) radius 1.25 projected
  circle A10 centre (33.25, 104.75) radius 1.25 projected
  circle A11 centre (-33.25, 104.75) radius 1.25 projected
  line L0 (41.275, 110.025) -> (-41.275, 110.025) projected
  arc A12 (-41.275, 110.025) -> (-47.625, 103.675) centre (-41.275, 103.675) ccw projected
  line L1 (-47.625, 103.675) -> (-47.625, -44.45) projected
  arc A13 (-47.625, -44.45) -> (-41.275, -50.8) centre (-41.275, -44.45) ccw projected
  line L2 (-41.275, -50.8) -> (41.275, -50.8) projected
  arc A14 (41.275, -50.8) -> (47.625, -44.45) centre (41.275, -44.45) ccw projected
  line L3 (47.625, -44.45) -> (47.625, 103.675) projected
  arc A15 (47.625, 103.675) -> (41.275, 110.025) centre (41.275, 103.675) ccw projected
  line L4 (-41.275, 110.125) -> (41.275, 110.125)
  arc A16 (47.725, 103.675) -> (41.275, 110.125) centre (41.275, 103.675) ccw
  line L5 (47.725, 103.675) -> (47.725, -44.45)
  arc A17 (41.275, -50.9) -> (47.725, -44.45) centre (41.275, -44.45) ccw
  line L6 (41.275, -50.9) -> (-41.275, -50.9)
  arc A18 (-47.725, -44.45) -> (-41.275, -50.9) centre (-41.275, -44.45) ccw
  line L7 (-47.725, -44.45) -> (-47.725, 103.675)
  arc A19 (-41.275, 110.125) -> (-47.725, 103.675) centre (-41.275, 103.675) ccw
  point P0 (0, 0)
  dimension "d82" = 0.1
extrude "Extrusion3" add sketch "Sketch2" against normal up to surface (3 mm away) contours L4 A16 L5 A17 L6 A18 L7 A19
equation "\"d13\" = 0.5 * d12"
equation "\"d15\" = 0.5 * d14"
equation "\"d19\" = d17"
equation "\"d20\" = d18"
equation "\"d28\" = 0.5 * d26"
equation "\"d67\" = d66"
equation "\"d68\" = d66"
equation "\"d69\" = d66"
equation "\"d70\" = d66"
equation "\"d71\" = d66"
equation "\"d72\" = d66"
equation "\"d78\" = d79"
properties part number "FrontCover"
